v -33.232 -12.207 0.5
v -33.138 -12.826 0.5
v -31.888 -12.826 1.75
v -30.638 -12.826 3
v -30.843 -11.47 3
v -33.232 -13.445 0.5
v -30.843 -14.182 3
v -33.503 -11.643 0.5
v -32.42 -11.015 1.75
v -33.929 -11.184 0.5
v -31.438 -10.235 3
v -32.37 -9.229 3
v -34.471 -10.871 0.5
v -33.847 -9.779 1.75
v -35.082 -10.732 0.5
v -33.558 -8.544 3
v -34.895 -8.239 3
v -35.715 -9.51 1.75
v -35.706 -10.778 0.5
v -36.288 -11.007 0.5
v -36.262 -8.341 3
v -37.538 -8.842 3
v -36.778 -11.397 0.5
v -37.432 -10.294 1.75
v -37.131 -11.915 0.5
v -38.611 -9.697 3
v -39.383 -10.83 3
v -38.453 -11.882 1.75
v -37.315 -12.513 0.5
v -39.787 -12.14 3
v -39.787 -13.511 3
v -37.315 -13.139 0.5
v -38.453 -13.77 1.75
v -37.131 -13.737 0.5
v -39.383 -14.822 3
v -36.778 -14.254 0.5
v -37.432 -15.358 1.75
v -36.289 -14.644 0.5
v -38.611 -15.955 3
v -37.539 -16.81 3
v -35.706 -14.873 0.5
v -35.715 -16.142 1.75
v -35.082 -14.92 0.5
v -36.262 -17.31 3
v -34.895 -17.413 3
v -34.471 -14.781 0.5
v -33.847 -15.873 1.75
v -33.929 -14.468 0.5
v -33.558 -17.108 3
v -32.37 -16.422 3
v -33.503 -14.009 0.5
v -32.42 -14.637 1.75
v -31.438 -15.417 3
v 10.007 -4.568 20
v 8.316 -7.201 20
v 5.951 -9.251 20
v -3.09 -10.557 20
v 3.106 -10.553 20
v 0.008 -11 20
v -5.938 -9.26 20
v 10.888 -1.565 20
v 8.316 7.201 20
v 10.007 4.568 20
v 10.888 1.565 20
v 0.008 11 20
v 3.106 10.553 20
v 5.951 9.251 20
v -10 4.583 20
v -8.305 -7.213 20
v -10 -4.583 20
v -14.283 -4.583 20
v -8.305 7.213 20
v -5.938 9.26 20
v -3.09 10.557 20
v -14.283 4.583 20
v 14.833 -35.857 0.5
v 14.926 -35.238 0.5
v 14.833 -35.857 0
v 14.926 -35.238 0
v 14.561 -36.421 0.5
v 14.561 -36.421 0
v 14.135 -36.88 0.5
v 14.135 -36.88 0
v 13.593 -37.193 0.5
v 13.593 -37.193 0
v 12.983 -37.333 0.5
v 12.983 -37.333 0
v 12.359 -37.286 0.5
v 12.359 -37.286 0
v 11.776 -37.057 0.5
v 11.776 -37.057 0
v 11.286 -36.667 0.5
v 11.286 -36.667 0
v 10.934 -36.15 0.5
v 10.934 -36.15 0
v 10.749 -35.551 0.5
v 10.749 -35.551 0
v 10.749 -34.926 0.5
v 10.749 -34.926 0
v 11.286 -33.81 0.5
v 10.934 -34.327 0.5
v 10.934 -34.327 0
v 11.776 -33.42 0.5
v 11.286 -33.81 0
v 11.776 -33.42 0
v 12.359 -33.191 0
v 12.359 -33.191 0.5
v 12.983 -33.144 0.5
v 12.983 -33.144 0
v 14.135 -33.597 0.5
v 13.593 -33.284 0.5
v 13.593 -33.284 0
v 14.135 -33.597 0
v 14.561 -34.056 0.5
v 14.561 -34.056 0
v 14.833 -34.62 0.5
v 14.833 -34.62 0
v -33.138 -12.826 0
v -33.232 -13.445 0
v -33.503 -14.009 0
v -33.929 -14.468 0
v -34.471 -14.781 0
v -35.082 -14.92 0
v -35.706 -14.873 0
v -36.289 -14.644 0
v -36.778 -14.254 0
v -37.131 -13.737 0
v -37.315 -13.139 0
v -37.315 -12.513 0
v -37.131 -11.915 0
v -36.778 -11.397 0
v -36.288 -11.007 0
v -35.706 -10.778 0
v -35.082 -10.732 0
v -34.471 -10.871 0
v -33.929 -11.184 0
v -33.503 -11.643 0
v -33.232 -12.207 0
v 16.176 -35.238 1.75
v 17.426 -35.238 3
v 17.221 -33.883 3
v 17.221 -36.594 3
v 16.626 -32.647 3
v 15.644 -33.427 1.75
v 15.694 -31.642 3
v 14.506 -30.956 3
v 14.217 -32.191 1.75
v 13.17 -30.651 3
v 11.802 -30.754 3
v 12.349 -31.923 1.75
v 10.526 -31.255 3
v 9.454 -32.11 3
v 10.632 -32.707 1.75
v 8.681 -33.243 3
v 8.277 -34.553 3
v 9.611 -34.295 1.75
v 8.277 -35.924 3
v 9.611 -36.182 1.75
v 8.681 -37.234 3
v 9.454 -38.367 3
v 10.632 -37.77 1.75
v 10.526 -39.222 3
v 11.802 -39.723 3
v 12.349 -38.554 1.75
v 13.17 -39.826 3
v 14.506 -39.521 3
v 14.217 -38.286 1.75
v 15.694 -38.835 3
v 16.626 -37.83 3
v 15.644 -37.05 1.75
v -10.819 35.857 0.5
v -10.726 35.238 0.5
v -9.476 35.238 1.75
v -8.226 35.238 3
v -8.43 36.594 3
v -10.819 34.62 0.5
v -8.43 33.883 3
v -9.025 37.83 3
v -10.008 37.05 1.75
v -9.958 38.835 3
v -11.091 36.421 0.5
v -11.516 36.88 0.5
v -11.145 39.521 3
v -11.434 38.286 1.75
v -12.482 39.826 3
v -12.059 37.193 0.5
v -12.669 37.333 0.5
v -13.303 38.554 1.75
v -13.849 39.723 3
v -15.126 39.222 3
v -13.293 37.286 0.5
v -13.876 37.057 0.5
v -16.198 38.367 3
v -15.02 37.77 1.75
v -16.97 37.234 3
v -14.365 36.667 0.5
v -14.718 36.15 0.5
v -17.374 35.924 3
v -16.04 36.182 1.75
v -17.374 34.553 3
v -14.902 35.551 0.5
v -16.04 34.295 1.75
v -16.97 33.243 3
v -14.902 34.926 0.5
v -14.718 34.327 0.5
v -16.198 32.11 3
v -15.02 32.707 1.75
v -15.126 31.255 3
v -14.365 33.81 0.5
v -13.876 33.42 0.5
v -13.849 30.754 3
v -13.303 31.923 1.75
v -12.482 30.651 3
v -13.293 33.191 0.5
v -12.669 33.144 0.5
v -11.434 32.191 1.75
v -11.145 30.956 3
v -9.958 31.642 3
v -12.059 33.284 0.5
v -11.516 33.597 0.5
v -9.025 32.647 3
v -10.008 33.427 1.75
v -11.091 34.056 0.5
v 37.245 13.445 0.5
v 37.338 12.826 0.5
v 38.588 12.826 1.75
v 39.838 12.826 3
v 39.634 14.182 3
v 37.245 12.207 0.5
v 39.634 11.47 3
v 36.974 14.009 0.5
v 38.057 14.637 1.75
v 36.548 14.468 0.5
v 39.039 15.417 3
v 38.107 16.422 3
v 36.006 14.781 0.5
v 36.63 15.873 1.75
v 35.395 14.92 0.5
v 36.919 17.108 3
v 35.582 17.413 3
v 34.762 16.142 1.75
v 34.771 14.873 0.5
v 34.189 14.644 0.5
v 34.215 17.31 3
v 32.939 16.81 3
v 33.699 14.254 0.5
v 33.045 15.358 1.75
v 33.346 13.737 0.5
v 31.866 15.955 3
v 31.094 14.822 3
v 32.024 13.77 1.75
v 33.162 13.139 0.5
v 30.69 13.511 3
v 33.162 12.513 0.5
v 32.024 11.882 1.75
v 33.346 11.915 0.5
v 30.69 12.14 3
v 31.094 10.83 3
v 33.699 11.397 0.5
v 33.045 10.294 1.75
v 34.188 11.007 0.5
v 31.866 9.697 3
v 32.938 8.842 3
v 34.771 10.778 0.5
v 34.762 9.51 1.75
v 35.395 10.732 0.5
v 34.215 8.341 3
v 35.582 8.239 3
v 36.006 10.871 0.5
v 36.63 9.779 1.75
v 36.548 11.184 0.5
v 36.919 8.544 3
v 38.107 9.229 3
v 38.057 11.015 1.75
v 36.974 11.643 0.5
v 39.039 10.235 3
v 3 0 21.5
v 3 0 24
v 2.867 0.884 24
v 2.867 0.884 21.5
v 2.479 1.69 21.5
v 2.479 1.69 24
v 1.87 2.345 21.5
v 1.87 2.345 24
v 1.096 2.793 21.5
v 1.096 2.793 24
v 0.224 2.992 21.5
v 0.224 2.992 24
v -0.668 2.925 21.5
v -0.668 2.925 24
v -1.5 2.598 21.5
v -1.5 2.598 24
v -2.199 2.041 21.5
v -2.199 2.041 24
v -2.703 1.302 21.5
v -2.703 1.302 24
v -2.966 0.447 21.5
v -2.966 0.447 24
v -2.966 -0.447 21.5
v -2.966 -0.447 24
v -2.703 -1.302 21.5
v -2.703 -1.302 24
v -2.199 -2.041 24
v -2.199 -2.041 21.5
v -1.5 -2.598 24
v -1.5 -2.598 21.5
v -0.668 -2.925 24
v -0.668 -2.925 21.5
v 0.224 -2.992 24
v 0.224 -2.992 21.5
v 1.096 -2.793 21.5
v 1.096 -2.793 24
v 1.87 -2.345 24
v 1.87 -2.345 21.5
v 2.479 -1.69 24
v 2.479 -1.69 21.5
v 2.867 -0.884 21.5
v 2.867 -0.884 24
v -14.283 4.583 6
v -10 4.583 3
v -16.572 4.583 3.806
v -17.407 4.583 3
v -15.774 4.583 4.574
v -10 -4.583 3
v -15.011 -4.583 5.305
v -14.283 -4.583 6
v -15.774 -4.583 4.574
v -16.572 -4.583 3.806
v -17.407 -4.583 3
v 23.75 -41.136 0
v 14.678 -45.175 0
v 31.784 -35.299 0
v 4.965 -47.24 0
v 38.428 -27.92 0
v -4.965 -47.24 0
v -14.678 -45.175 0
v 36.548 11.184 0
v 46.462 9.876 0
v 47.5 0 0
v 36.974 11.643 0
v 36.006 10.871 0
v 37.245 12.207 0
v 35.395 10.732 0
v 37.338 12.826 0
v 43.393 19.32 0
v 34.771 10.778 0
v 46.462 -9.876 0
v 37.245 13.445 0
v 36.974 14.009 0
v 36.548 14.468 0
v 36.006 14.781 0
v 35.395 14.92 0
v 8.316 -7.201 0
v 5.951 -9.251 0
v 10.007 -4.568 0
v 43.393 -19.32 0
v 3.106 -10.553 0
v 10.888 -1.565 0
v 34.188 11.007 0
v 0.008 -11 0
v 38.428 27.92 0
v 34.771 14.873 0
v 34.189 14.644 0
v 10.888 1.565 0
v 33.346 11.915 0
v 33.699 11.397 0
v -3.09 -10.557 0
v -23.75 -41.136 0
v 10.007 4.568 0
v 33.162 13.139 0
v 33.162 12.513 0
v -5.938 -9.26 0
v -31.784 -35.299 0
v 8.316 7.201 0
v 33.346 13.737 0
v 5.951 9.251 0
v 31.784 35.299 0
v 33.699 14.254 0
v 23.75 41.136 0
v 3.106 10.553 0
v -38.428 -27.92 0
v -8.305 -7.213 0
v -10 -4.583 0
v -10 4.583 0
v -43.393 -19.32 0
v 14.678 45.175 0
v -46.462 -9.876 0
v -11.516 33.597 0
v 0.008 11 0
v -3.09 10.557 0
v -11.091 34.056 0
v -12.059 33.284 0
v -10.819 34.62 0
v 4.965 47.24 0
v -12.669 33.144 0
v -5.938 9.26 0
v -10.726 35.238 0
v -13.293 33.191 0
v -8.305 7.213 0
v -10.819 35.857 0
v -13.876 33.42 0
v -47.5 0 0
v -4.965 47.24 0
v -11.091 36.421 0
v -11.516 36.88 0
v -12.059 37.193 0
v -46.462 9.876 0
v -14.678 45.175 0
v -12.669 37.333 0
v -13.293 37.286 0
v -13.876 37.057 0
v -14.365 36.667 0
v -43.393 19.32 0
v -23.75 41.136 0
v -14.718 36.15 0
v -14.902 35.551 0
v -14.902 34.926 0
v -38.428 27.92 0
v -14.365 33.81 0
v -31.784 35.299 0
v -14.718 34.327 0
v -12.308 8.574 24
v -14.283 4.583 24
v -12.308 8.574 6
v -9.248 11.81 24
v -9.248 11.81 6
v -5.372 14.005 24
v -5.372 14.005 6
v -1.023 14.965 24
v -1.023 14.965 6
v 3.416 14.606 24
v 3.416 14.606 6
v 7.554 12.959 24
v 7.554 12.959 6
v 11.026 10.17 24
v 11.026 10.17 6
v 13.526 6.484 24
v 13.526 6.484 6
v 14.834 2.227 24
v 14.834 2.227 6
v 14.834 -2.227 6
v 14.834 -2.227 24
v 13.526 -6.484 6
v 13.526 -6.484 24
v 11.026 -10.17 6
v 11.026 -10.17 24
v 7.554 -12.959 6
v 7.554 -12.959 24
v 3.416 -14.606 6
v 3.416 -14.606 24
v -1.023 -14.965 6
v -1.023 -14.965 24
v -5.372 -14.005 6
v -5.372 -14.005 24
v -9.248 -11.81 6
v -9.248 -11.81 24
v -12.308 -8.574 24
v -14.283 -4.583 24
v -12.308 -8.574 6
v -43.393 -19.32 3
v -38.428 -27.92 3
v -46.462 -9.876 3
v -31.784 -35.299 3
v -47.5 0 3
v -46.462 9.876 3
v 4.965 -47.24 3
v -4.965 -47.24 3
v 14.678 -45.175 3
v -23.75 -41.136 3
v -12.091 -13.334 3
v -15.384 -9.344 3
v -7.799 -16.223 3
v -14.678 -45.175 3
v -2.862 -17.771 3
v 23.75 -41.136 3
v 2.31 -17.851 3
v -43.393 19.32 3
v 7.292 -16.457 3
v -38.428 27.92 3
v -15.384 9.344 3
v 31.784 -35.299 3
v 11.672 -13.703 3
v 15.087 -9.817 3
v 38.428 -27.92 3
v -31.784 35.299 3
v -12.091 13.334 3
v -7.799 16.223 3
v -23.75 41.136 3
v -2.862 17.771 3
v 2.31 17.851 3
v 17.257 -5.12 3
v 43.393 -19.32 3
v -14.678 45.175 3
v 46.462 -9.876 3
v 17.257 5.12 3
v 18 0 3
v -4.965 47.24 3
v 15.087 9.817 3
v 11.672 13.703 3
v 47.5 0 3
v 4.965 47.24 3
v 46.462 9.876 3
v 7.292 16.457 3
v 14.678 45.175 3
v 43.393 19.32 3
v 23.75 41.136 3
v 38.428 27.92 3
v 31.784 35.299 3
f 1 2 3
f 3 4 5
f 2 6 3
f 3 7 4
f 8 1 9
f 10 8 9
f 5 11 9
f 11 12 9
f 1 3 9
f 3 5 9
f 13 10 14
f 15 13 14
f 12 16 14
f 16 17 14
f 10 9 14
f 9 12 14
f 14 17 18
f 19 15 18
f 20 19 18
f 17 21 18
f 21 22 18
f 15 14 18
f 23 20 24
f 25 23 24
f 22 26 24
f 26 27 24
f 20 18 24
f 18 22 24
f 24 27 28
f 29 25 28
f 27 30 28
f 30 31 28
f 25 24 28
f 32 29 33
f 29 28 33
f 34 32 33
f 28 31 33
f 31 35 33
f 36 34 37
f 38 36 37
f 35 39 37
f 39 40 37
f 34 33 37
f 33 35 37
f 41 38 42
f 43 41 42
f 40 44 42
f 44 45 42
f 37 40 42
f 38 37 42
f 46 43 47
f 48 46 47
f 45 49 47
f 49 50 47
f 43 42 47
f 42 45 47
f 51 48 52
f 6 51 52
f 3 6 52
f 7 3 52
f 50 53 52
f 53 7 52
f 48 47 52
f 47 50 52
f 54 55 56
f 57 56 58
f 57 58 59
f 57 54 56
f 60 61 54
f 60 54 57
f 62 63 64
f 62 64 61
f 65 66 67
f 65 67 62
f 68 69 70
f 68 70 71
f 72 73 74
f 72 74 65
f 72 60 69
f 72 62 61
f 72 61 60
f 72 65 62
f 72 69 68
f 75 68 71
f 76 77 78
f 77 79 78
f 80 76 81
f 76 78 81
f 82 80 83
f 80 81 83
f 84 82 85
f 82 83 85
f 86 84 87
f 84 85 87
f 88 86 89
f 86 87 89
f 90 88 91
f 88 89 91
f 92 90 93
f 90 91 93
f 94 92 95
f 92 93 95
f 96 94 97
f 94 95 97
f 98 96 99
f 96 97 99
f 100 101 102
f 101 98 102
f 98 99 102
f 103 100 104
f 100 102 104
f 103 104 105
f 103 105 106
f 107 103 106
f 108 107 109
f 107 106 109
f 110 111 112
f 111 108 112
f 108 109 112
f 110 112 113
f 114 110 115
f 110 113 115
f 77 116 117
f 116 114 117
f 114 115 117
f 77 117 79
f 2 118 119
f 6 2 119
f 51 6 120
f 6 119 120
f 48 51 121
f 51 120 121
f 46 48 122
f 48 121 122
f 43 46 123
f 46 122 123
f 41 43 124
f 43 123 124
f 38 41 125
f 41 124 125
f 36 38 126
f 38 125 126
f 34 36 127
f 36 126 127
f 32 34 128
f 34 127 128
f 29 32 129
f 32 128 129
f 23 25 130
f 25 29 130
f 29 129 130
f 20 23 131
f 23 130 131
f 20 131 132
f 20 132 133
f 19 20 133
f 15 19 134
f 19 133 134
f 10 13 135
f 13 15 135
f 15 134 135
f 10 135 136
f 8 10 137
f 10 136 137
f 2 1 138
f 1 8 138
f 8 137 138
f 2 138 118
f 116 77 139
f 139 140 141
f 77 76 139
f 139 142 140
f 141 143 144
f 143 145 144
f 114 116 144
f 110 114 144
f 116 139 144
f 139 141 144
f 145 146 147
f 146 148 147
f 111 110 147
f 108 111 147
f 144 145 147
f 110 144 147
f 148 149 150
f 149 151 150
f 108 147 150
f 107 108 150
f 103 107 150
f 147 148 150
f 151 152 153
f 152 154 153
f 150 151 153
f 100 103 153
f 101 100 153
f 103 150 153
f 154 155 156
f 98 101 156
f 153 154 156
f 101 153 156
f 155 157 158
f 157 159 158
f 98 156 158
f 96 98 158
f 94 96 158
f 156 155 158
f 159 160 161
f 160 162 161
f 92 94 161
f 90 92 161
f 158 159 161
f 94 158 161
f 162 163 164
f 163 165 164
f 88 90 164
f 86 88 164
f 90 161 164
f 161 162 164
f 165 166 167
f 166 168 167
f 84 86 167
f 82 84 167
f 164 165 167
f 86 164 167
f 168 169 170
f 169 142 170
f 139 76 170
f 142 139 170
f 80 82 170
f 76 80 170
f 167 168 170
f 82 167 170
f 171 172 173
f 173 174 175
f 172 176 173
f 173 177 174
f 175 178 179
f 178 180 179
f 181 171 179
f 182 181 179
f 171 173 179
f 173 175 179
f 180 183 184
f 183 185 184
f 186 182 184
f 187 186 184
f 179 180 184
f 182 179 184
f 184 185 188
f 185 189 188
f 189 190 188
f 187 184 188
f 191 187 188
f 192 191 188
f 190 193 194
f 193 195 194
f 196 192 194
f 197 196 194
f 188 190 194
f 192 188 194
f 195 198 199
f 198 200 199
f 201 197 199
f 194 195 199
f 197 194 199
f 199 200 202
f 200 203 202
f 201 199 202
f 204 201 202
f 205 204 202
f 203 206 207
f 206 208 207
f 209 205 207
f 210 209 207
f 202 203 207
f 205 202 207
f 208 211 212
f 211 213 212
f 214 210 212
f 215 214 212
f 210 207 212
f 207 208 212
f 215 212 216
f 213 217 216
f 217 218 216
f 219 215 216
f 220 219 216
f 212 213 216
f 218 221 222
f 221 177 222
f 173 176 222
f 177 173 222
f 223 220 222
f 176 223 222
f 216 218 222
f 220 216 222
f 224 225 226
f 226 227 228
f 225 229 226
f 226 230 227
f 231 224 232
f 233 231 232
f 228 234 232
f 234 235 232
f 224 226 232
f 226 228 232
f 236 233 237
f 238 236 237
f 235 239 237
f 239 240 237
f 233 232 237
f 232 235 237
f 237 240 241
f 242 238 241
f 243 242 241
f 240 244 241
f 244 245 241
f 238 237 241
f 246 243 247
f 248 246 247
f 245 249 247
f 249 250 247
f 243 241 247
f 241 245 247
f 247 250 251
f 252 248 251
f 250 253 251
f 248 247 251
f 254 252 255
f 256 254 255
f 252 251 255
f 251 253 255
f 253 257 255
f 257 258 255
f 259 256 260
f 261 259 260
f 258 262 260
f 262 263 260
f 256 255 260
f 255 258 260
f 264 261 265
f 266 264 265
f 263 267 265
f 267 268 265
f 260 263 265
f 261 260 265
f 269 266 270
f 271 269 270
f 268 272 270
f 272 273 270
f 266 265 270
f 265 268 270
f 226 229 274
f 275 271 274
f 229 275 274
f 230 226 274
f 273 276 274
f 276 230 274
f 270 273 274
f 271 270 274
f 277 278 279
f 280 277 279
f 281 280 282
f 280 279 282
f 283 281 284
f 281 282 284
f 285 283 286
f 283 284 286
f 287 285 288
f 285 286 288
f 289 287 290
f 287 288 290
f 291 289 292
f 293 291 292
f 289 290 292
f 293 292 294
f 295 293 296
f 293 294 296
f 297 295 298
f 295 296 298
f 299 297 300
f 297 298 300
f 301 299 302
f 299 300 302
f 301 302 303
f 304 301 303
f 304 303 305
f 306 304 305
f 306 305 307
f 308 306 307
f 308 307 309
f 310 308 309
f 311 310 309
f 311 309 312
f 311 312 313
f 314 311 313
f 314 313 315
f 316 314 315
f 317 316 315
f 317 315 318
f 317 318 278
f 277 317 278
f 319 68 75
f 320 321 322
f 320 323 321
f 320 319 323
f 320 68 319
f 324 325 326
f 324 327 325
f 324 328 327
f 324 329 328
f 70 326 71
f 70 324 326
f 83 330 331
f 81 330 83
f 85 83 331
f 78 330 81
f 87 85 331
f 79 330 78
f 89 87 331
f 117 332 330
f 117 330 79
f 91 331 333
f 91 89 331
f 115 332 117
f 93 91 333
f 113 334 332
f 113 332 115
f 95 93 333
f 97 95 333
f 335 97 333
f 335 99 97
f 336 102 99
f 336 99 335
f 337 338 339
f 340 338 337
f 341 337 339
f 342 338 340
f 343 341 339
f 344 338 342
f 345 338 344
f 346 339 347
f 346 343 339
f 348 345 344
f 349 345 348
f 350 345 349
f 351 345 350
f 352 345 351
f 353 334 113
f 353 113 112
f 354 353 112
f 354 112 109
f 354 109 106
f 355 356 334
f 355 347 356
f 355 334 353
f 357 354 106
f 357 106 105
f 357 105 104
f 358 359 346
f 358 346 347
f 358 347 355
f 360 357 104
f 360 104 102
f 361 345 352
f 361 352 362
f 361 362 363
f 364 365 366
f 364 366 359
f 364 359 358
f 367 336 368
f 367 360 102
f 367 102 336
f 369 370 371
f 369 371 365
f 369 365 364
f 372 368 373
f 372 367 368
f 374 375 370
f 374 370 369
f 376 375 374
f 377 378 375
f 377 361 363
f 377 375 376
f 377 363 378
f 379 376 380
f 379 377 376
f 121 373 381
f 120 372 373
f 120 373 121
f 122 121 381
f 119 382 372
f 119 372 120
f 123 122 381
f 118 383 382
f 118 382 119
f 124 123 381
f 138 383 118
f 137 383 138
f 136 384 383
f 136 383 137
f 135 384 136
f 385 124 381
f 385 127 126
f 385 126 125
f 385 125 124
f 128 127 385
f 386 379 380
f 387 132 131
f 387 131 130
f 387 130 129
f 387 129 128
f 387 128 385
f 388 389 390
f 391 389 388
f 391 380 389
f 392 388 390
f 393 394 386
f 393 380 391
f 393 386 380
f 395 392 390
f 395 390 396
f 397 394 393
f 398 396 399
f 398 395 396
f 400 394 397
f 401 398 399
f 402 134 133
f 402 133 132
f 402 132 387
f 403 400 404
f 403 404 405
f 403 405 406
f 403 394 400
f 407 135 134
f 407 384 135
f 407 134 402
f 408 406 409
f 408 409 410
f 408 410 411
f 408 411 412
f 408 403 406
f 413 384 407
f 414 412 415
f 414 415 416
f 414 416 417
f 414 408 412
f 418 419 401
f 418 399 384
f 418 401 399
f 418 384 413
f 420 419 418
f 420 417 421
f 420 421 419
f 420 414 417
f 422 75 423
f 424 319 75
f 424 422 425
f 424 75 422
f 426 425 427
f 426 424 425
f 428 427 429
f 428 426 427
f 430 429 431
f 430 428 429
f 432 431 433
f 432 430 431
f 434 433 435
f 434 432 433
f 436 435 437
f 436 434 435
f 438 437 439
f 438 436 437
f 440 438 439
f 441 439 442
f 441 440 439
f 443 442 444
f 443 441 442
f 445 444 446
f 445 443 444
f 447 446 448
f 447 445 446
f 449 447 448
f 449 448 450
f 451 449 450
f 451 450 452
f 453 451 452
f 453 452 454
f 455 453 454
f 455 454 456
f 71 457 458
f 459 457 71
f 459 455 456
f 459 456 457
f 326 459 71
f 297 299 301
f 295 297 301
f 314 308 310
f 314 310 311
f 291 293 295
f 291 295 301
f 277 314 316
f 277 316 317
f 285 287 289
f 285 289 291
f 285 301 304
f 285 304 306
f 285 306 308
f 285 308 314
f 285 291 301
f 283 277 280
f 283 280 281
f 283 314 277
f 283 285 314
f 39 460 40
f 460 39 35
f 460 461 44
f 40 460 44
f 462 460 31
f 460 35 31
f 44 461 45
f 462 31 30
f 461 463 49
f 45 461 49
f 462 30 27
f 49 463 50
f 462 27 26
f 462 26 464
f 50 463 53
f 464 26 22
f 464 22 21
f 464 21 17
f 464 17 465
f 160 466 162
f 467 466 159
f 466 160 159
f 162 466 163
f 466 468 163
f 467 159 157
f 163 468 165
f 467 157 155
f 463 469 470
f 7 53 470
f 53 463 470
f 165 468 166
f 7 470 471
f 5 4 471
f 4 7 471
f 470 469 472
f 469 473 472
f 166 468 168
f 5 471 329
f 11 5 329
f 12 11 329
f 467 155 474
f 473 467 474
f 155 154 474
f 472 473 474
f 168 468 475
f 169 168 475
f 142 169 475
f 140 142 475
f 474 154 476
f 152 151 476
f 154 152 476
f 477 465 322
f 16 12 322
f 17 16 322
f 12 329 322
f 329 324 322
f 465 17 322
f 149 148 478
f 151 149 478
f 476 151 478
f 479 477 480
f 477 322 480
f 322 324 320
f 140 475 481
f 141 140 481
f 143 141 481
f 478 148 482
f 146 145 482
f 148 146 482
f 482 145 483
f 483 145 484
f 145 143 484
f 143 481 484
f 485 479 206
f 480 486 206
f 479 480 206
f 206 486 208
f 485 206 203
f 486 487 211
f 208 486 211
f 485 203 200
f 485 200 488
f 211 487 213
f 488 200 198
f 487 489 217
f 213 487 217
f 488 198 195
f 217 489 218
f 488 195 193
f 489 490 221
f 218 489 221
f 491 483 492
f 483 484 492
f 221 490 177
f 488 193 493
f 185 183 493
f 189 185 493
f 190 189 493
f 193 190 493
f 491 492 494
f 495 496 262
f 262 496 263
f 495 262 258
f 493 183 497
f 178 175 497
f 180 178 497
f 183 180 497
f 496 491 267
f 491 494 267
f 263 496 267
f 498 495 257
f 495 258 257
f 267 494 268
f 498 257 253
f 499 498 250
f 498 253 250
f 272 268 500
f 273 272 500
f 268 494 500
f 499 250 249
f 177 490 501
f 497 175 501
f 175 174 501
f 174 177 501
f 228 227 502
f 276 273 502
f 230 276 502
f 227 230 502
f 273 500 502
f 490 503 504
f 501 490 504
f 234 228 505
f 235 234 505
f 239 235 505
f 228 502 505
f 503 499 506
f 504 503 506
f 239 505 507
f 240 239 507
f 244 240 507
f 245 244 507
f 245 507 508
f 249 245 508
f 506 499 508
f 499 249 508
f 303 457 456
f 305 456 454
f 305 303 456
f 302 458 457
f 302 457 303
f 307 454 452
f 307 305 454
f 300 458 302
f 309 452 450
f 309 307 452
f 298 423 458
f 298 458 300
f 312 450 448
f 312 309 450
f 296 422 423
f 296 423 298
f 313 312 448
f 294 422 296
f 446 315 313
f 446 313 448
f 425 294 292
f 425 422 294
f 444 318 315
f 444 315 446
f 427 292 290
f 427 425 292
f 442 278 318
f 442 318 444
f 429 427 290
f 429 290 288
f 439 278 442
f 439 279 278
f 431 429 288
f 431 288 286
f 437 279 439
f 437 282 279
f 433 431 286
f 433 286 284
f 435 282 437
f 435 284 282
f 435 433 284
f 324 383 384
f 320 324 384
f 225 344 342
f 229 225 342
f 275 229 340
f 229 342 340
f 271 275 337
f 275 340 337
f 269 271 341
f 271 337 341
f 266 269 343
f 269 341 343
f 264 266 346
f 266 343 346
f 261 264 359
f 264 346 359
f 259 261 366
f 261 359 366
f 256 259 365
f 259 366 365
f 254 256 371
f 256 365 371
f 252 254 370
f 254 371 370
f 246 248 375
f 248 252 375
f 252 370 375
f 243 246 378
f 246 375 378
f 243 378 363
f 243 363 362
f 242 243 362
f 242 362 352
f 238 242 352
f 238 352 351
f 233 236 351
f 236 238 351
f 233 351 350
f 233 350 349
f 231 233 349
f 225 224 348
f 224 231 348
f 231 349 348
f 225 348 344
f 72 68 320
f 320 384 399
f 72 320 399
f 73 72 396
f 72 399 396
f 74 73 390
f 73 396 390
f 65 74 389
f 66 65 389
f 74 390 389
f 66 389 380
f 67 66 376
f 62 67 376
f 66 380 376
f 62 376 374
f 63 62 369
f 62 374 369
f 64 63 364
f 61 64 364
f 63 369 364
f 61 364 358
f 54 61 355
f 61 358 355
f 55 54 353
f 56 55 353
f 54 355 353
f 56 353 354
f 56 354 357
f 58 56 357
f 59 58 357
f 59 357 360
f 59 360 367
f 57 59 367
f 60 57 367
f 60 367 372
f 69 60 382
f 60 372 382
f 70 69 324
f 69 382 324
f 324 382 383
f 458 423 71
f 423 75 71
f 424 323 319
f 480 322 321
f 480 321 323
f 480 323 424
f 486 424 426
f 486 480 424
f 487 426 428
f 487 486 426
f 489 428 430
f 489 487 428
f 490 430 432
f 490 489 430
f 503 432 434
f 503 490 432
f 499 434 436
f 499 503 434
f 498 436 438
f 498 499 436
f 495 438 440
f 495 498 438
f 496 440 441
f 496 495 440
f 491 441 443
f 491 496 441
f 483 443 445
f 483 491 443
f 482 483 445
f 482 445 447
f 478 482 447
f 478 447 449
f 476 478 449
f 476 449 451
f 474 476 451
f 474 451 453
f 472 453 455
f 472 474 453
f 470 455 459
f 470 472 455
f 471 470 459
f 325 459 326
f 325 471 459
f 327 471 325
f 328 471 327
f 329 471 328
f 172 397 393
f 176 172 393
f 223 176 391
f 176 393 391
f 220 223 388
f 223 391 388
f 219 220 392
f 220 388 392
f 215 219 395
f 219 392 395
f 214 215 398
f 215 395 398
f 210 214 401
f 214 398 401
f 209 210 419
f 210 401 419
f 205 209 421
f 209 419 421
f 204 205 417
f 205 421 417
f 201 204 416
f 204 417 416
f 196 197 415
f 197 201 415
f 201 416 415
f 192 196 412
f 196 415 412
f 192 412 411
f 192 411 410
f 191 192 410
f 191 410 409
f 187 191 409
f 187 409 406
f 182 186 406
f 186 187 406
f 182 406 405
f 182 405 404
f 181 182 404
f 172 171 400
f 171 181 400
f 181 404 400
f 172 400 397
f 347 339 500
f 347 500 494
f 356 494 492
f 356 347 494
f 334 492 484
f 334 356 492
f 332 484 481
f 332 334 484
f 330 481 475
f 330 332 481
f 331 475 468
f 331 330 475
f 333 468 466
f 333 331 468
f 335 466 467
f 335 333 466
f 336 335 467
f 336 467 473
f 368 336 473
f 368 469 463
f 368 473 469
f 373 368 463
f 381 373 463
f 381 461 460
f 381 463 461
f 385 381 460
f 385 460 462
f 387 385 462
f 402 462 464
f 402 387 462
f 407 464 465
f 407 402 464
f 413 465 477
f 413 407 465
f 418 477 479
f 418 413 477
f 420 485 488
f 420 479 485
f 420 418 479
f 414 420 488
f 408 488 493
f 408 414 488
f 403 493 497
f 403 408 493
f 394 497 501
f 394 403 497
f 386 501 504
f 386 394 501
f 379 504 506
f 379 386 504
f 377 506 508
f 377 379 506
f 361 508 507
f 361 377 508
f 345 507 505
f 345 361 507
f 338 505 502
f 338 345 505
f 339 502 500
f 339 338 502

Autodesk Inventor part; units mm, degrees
ref_plane "YZ Plane" through (0, 0, 0) normal (1, 0, 0) x (0, 1, 0)
ref_plane "XZ Plane" through (0, 0, 0) normal (0, 1, 0) x (-1, 0, 0)
ref_plane "XY Plane" through (0, 0, 0) normal (0, 0, 1) x (1, 0, 0)
sketch "Skizze1" plane through (0, 0, 0) normal (0, 0, 1) x (1, 0, 0)
  circle A0 centre (-35.2385, -12.8258) radius 2.1 projected
  circle A1 centre (-12.8258, 35.2385) radius 2.1 projected
  circle A2 centre (12.8258, -35.2385) radius 2.1 projected
  circle A3 centre (35.2385, 12.8258) radius 2.1 projected
  circle A4 centre (0, 0) radius 25 projected
  circle A5 centre (0, 0) radius 45 projected
  circle A6 centre (0, 0) radius 47.5 projected
  circle A7 centre (0, 0) radius 8.4675
  point P0 (0, 0)
extrude "Extrusion1" add sketch "Skizze1" along normal blind 3 contours A4 | A5 | A6 | A7
sketch "Skizze2" plane through (0, 0, 3) normal (0, 0, 1) x (1, 0, 0)
  circle A0 centre (0, 0) radius 15
  dimension "d2" = 30
extrude "Extrusion2" add sketch "Skizze2" along normal blind 21
sketch "Skizze3" plane through (0, 0, 24) normal (0, 0, 1) x (1, 0, 0)
  circle A0 centre (0, 0) radius 3
  dimension "d7" = 6
extrude "Extrusion3" cut sketch "Skizze3" against normal blind 2.5
sketch "Skizze4" plane through (0, 0, 0) normal (0, 0, -1) x (-1, 0, 0)
  circle A0 centre (0, 0) radius 15 projected
  circle A1 centre (0, 0) radius 11
  dimension "d8" = 4
extrude "Extrusion4" cut sketch "Skizze4" against normal blind 20 contours A1
sketch "Skizze5" plane through (0, 0, 0) normal (0, 0, -1) x (-1, 0, 0)
  circle A0 centre (0, 0) radius 11 projected
  circle A1 centre (-35.2385, 12.8258) radius 2.1 projected
  circle A2 centre (-12.8258, -35.2385) radius 2.1 projected
  circle A3 centre (12.8258, 35.2385) radius 2.1 projected
  circle A4 centre (35.2385, -12.8258) radius 2.1 projected
  circle A5 centre (0, 0) radius 47.5 projected
  line L0 (10, -4.5826) -> (10, 4.5826)
  dimension "d11" = 10
extrude "Extrusion5" add sketch "Skizze5" against normal up to surface (20 mm away) contours A0 L0 picked at (10.1839, -1.0361)
sketch "Skizze6" plane through (-10, -4.5826, 0) normal (1, 0, 0) x (0, 0, -1)
  line L0 (-20, 0) -> (-20, 9.1652) projected
  line L1 (0, 0) -> (-20, 0) projected
  line L2 (0, 9.1652) -> (0, 0) projected
  line L3 (-20, 9.1652) -> (0, 9.1652) projected
  line L4 (-3, -10.4174) -> (-3, 19.5826) projected
  line L5 (-3, 15.3083) -> (-3, 19.5083) projected
  line L6 (-3, -32.7559) -> (-3, -28.5559) projected
  line L7 (-3, 37.721) -> (-3, 41.921) projected
  line L8 (-3, -10.3432) -> (-3, -6.1432) projected
  line L9 (-3, 52.0826) -> (-3, -42.9174) projected
  line L10 (-3, 0) -> (-20, 0)
  line L11 (-20, 0) -> (-20, 9.1652)
  line L12 (-20, 9.1652) -> (-3, 9.1652)
  line L13 (-3, 9.1652) -> (-3, 0)
  point P0 (0, 4.5826)
extrude "Extrusion6" cut sketch "Skizze6" against normal blind 20 contours L0 L3 L4 L1
sketch "Skizze7" plane through (0, 0, 20) normal (0, 0, -1) x (-1, 0, 0)
  arc A0 (10, 4.5826) -> (10, -4.5826) centre (0, 0) ccw projected
  line L0 (10, -4.5826) -> (14.2829, -4.5826) projected
  arc A1 (14.2829, -4.5826) -> (14.2829, 4.5826) centre (0, 0) ccw projected
  line L1 (10, 4.5826) -> (14.2829, 4.5826) projected
  line L2 (14.2829, 4.5826) -> (14.2829, -4.5826)
extrude "Extrusion7" cut sketch "Skizze7" against normal blind 20 contours A1 L2
chamfer "Fase1" distance 3 angle 45 1 edges at (15, 0, 3)
chamfer "Fase2" distance 2.5 angle 45 4 edges at (-14.9258, 35.2385, 3) (33.1385, 12.8258, 3) (10.7258, -35.2385, 3) (-37.3385, -12.8258, 3)
properties part number "OberArmMagnet" material "ABS-Kunststoff"
